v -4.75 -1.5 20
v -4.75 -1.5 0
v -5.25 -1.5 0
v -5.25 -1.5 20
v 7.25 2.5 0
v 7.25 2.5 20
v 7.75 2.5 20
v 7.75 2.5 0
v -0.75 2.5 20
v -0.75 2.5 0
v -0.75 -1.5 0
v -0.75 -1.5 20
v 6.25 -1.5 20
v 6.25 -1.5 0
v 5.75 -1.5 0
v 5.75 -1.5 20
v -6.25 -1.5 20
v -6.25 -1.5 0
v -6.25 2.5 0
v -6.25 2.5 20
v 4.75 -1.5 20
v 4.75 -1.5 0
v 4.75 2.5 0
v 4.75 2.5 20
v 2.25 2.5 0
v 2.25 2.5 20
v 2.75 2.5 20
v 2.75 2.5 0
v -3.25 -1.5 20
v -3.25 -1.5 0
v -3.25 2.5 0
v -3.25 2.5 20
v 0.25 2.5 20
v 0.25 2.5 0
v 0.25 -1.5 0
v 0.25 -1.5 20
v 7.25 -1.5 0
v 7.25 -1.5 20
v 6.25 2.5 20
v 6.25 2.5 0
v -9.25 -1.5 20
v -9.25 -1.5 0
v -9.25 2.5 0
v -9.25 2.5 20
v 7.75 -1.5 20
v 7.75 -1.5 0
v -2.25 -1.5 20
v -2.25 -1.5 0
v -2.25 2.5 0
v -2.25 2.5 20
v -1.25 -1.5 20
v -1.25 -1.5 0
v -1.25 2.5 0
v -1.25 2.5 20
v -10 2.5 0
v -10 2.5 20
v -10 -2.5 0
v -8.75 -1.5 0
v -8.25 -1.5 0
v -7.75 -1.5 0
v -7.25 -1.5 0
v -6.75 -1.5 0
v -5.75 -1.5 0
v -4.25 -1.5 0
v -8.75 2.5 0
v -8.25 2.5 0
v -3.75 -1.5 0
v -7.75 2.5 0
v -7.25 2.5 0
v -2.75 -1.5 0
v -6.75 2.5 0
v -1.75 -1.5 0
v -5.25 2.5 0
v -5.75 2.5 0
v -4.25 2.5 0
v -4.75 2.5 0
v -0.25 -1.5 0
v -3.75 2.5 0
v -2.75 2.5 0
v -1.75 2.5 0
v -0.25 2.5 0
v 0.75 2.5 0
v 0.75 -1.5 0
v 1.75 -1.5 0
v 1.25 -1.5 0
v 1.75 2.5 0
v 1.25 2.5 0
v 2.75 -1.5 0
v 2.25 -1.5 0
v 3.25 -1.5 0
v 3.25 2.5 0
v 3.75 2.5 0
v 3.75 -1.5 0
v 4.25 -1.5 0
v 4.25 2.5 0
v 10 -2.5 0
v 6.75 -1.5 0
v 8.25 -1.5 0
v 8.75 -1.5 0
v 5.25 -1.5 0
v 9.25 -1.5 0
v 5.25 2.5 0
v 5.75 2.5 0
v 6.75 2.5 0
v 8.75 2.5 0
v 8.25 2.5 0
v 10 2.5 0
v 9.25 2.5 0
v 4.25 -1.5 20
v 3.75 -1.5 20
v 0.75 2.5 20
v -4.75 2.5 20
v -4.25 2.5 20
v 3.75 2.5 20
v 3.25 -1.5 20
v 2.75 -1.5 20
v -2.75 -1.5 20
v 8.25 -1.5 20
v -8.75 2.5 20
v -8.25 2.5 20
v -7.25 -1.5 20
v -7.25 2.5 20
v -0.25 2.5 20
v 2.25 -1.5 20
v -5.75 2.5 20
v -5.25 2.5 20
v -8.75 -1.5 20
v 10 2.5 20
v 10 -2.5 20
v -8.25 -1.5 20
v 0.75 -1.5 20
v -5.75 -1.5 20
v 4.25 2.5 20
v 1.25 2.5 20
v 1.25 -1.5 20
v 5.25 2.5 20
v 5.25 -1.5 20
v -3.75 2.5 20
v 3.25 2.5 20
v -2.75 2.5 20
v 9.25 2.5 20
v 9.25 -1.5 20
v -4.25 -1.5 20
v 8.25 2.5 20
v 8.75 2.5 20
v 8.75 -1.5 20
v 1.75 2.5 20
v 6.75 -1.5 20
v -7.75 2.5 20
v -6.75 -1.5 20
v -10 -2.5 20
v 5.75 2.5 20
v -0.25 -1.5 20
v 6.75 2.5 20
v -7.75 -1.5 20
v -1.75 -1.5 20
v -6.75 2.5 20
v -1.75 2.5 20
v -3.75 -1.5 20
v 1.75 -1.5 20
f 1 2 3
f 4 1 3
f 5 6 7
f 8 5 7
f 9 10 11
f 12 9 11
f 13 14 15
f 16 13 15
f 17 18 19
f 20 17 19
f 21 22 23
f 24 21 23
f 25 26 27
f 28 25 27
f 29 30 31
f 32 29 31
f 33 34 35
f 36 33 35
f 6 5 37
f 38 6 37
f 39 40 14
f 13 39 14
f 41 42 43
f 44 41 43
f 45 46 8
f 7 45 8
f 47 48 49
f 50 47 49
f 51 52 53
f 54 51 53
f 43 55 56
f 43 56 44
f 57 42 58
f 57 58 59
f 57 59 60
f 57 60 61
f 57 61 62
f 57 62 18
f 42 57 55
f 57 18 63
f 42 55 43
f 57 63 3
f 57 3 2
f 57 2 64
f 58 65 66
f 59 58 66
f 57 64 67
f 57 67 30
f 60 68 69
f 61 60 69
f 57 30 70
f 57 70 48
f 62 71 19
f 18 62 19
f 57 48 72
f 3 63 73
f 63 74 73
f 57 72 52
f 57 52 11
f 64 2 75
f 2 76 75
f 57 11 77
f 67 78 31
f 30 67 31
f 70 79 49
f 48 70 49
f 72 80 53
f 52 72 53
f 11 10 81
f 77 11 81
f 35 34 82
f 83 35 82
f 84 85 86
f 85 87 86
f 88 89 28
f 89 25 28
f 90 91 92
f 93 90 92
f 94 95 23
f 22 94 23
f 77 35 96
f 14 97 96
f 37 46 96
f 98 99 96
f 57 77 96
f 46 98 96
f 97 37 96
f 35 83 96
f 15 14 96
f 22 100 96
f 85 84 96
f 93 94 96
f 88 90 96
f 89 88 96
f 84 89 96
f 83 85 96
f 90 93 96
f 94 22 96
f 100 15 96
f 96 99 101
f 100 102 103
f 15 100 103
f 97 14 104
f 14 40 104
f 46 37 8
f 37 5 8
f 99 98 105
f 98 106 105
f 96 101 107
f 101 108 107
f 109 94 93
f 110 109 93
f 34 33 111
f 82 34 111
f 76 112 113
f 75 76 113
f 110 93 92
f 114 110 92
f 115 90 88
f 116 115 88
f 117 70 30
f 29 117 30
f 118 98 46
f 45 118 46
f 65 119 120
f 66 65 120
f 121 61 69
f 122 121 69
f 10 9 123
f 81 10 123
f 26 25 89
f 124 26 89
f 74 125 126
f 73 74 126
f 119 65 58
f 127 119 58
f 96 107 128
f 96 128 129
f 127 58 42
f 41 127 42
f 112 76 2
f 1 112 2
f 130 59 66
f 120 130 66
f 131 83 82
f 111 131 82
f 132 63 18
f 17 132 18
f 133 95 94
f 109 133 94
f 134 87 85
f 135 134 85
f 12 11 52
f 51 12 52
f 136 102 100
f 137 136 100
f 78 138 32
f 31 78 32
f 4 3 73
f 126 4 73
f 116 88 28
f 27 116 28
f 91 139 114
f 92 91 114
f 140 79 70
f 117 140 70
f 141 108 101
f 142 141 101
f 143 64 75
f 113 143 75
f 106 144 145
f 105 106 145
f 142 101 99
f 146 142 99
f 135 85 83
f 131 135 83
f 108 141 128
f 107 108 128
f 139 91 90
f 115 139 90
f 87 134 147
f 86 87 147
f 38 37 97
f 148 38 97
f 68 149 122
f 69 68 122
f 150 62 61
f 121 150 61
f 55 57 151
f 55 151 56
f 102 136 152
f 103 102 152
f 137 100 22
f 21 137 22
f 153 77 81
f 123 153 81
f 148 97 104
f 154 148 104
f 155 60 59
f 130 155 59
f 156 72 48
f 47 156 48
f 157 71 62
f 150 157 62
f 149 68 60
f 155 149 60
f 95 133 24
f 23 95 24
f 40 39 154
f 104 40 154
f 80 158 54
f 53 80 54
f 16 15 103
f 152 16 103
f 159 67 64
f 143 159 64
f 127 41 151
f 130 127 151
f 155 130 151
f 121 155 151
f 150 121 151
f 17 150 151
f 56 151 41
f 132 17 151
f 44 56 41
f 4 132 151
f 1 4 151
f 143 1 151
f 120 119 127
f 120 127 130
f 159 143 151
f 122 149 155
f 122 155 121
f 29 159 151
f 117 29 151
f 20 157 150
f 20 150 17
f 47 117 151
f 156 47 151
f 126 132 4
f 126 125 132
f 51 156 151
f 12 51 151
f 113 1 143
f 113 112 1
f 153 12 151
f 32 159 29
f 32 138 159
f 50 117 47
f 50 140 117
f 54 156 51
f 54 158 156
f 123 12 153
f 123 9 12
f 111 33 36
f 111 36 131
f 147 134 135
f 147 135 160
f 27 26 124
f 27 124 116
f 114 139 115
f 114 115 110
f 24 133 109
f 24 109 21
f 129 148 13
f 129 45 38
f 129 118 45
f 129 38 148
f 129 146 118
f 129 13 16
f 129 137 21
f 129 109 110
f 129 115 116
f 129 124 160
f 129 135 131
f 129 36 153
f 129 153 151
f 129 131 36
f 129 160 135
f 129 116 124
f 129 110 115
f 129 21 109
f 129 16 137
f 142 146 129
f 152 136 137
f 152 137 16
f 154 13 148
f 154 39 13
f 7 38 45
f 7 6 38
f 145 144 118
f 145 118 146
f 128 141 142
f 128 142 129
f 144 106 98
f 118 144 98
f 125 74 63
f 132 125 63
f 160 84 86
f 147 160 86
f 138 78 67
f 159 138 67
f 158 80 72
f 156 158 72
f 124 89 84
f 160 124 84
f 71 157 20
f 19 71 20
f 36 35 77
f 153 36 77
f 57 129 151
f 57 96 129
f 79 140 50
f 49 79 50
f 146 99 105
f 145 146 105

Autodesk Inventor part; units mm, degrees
ref_plane "YZ Plane" through (0, 0, 0) normal (1, 0, 0) x (0, 1, 0)
ref_plane "XZ Plane" through (0, 0, 0) normal (0, 1, 0) x (-1, 0, 0)
ref_plane "XY Plane" through (0, 0, 0) normal (0, 0, 1) x (1, 0, 0)
sketch "Sketch1" plane through (0, 0, 0) normal (0, 0, 1) x (1, 0, 0)
  line L0 (-10, 2.5) -> (10, 2.5)
  line L1 (10, 2.5) -> (10, -2.5)
  line L2 (10, -2.5) -> (-10, -2.5)
  line L3 (-10, -2.5) -> (-10, 2.5)
  line L4 (-10, 2.5) -> (10, -2.5) construction
  line L5 (10, 2.5) -> (-10, -2.5) construction
  point P0 (0, 0)
  dimension "d0" = 20
  dimension "d1" = 5
extrude "Extrusion1" add sketch "Sketch1" along normal blind 20
sketch "Sketch2" plane through (0, 0, 20) normal (0, 0, 1) x (1, 0, 0)
  line L0 (-0.25, 3.3824) -> (0.25, 3.3824)
  line L1 (0.25, 3.3824) -> (0.25, -1.5)
  line L2 (0.25, -1.5) -> (-0.25, -1.5)
  line L3 (-0.25, -1.5) -> (-0.25, 3.3824)
  line L4 (-0.25, 3.3824) -> (0.25, -1.5) construction
  line L5 (0.25, 3.3824) -> (-0.25, -1.5) construction
  line L6 (-10, -2.5) -> (10, -2.5) projected
  line L7 (0.75, 3.3824) -> (1.25, 3.3824)
  line L8 (1.25, 3.3824) -> (1.25, -1.5)
  line L9 (1.25, -1.5) -> (0.75, -1.5)
  line L10 (0.75, -1.5) -> (0.75, 3.3824)
  line L11 (0.75, 3.3824) -> (1.25, -1.5) construction
  line L12 (1.25, 3.3824) -> (0.75, -1.5) construction
  line L13 (1.75, 3.3824) -> (2.25, 3.3824)
  line L14 (2.25, 3.3824) -> (2.25, -1.5)
  line L15 (2.25, -1.5) -> (1.75, -1.5)
  line L16 (1.75, -1.5) -> (1.75, 3.3824)
  line L17 (1.75, 3.3824) -> (2.25, -1.5) construction
  line L18 (2.25, 3.3824) -> (1.75, -1.5) construction
  line L19 (2.75, 3.3824) -> (3.25, 3.3824)
  line L20 (3.25, 3.3824) -> (3.25, -1.5)
  line L21 (3.25, -1.5) -> (2.75, -1.5)
  line L22 (2.75, -1.5) -> (2.75, 3.3824)
  line L23 (2.75, 3.3824) -> (3.25, -1.5) construction
  line L24 (3.25, 3.3824) -> (2.75, -1.5) construction
  line L25 (3.75, 3.3824) -> (4.25, 3.3824)
  line L26 (4.25, 3.3824) -> (4.25, -1.5)
  line L27 (4.25, -1.5) -> (3.75, -1.5)
  line L28 (3.75, -1.5) -> (3.75, 3.3824)
  line L29 (3.75, 3.3824) -> (4.25, -1.5) construction
  line L30 (4.25, 3.3824) -> (3.75, -1.5) construction
  line L31 (4.75, 3.3824) -> (5.25, 3.3824)
  line L32 (5.25, 3.3824) -> (5.25, -1.5)
  line L33 (5.25, -1.5) -> (4.75, -1.5)
  line L34 (4.75, -1.5) -> (4.75, 3.3824)
  line L35 (4.75, 3.3824) -> (5.25, -1.5) construction
  line L36 (5.25, 3.3824) -> (4.75, -1.5) construction
  line L37 (5.75, 3.3824) -> (6.25, 3.3824)
  line L38 (6.25, 3.3824) -> (6.25, -1.5)
  line L39 (6.25, -1.5) -> (5.75, -1.5)
  line L40 (5.75, -1.5) -> (5.75, 3.3824)
  line L41 (5.75, 3.3824) -> (6.25, -1.5) construction
  line L42 (6.25, 3.3824) -> (5.75, -1.5) construction
  line L43 (6.75, 3.3824) -> (7.25, 3.3824)
  line L44 (7.25, 3.3824) -> (7.25, -1.5)
  line L45 (7.25, -1.5) -> (6.75, -1.5)
  line L46 (6.75, -1.5) -> (6.75, 3.3824)
  line L47 (6.75, 3.3824) -> (7.25, -1.5) construction
  line L48 (7.25, 3.3824) -> (6.75, -1.5) construction
  line L49 (7.75, 3.3824) -> (8.25, 3.3824)
  line L50 (8.25, 3.3824) -> (8.25, -1.5)
  line L51 (8.25, -1.5) -> (7.75, -1.5)
  line L52 (7.75, -1.5) -> (7.75, 3.3824)
  line L53 (7.75, 3.3824) -> (8.25, -1.5) construction
  line L54 (8.25, 3.3824) -> (7.75, -1.5) construction
  line L55 (8.75, 3.3824) -> (9.25, 3.3824)
  line L56 (9.25, 3.3824) -> (9.25, -1.5)
  line L57 (9.25, -1.5) -> (8.75, -1.5)
  line L58 (8.75, -1.5) -> (8.75, 3.3824)
  line L59 (8.75, 3.3824) -> (9.25, -1.5) construction
  line L60 (9.25, 3.3824) -> (8.75, -1.5) construction
  line L61 (-1.25, 3.3824) -> (-0.75, 3.3824)
  line L62 (-0.75, 3.3824) -> (-0.75, -1.5)
  line L63 (-0.75, -1.5) -> (-1.25, -1.5)
  line L64 (-1.25, -1.5) -> (-1.25, 3.3824)
  line L65 (-1.25, 3.3824) -> (-0.75, -1.5) construction
  line L66 (-0.75, 3.3824) -> (-1.25, -1.5) construction
  line L67 (-0.25, 3.3824) -> (0.25, 3.3824)
  line L68 (0.25, 3.3824) -> (0.25, -1.5)
  line L69 (0.25, -1.5) -> (-0.25, -1.5)
  line L70 (-0.25, -1.5) -> (-0.25, 3.3824)
  line L71 (-0.25, 3.3824) -> (0.25, -1.5) construction
  line L72 (0.25, 3.3824) -> (-0.25, -1.5) construction
  line L73 (0.75, 3.3824) -> (1.25, 3.3824)
  line L74 (1.25, 3.3824) -> (1.25, -1.5)
  line L75 (1.25, -1.5) -> (0.75, -1.5)
  line L76 (0.75, -1.5) -> (0.75, 3.3824)
  line L77 (0.75, 3.3824) -> (1.25, -1.5) construction
  line L78 (1.25, 3.3824) -> (0.75, -1.5) construction
  line L79 (1.75, 3.3824) -> (2.25, 3.3824)
  line L80 (2.25, 3.3824) -> (2.25, -1.5)
  line L81 (2.25, -1.5) -> (1.75, -1.5)
  line L82 (1.75, -1.5) -> (1.75, 3.3824)
  line L83 (1.75, 3.3824) -> (2.25, -1.5) construction
  line L84 (2.25, 3.3824) -> (1.75, -1.5) construction
  line L85 (2.75, 3.3824) -> (3.25, 3.3824)
  line L86 (3.25, 3.3824) -> (3.25, -1.5)
  line L87 (3.25, -1.5) -> (2.75, -1.5)
  line L88 (2.75, -1.5) -> (2.75, 3.3824)
  line L89 (2.75, 3.3824) -> (3.25, -1.5) construction
  line L90 (3.25, 3.3824) -> (2.75, -1.5) construction
  line L91 (3.75, 3.3824) -> (4.25, 3.3824)
  line L92 (4.25, 3.3824) -> (4.25, -1.5)
  line L93 (4.25, -1.5) -> (3.75, -1.5)
  line L94 (3.75, -1.5) -> (3.75, 3.3824)
  line L95 (3.75, 3.3824) -> (4.25, -1.5) construction
  line L96 (4.25, 3.3824) -> (3.75, -1.5) construction
  line L97 (4.75, 3.3824) -> (5.25, 3.3824)
  line L98 (5.25, 3.3824) -> (5.25, -1.5)
  line L99 (5.25, -1.5) -> (4.75, -1.5)
  line L100 (4.75, -1.5) -> (4.75, 3.3824)
  line L101 (4.75, 3.3824) -> (5.25, -1.5) construction
  line L102 (5.25, 3.3824) -> (4.75, -1.5) construction
  line L103 (5.75, 3.3824) -> (6.25, 3.3824)
  line L104 (6.25, 3.3824) -> (6.25, -1.5)
  line L105 (6.25, -1.5) -> (5.75, -1.5)
  line L106 (5.75, -1.5) -> (5.75, 3.3824)
  line L107 (5.75, 3.3824) -> (6.25, -1.5) construction
  line L108 (6.25, 3.3824) -> (5.75, -1.5) construction
  line L109 (6.75, 3.3824) -> (7.25, 3.3824)
  line L110 (7.25, 3.3824) -> (7.25, -1.5)
  line L111 (7.25, -1.5) -> (6.75, -1.5)
  line L112 (6.75, -1.5) -> (6.75, 3.3824)
  line L113 (6.75, 3.3824) -> (7.25, -1.5) construction
  line L114 (7.25, 3.3824) -> (6.75, -1.5) construction
  line L115 (7.75, 3.3824) -> (8.25, 3.3824)
  line L116 (8.25, 3.3824) -> (8.25, -1.5)
  line L117 (8.25, -1.5) -> (7.75, -1.5)
  line L118 (7.75, -1.5) -> (7.75, 3.3824)
  line L119 (7.75, 3.3824) -> (8.25, -1.5) construction
  line L120 (8.25, 3.3824) -> (7.75, -1.5) construction
  line L121 (-2.25, 3.3824) -> (-1.75, 3.3824)
  line L122 (-1.75, 3.3824) -> (-1.75, -1.5)
  line L123 (-1.75, -1.5) -> (-2.25, -1.5)
  line L124 (-2.25, -1.5) -> (-2.25, 3.3824)
  line L125 (-2.25, 3.3824) -> (-1.75, -1.5) construction
  line L126 (-1.75, 3.3824) -> (-2.25, -1.5) construction
  line L127 (-1.25, 3.3824) -> (-0.75, 3.3824)
  line L128 (-0.75, 3.3824) -> (-0.75, -1.5)
  line L129 (-0.75, -1.5) -> (-1.25, -1.5)
  line L130 (-1.25, -1.5) -> (-1.25, 3.3824)
  line L131 (-1.25, 3.3824) -> (-0.75, -1.5) construction
  line L132 (-0.75, 3.3824) -> (-1.25, -1.5) construction
  line L133 (-0.25, 3.3824) -> (0.25, 3.3824)
  line L134 (0.25, 3.3824) -> (0.25, -1.5)
  line L135 (0.25, -1.5) -> (-0.25, -1.5)
  line L136 (-0.25, -1.5) -> (-0.25, 3.3824)
  line L137 (-0.25, 3.3824) -> (0.25, -1.5) construction
  line L138 (0.25, 3.3824) -> (-0.25, -1.5) construction
  line L139 (0.75, 3.3824) -> (1.25, 3.3824)
  line L140 (1.25, 3.3824) -> (1.25, -1.5)
  line L141 (1.25, -1.5) -> (0.75, -1.5)
  line L142 (0.75, -1.5) -> (0.75, 3.3824)
  line L143 (0.75, 3.3824) -> (1.25, -1.5) construction
  line L144 (1.25, 3.3824) -> (0.75, -1.5) construction
  line L145 (1.75, 3.3824) -> (2.25, 3.3824)
  line L146 (2.25, 3.3824) -> (2.25, -1.5)
  line L147 (2.25, -1.5) -> (1.75, -1.5)
  line L148 (1.75, -1.5) -> (1.75, 3.3824)
  line L149 (1.75, 3.3824) -> (2.25, -1.5) construction
  line L150 (2.25, 3.3824) -> (1.75, -1.5) construction
  line L151 (2.75, 3.3824) -> (3.25, 3.3824)
  line L152 (3.25, 3.3824) -> (3.25, -1.5)
  line L153 (3.25, -1.5) -> (2.75, -1.5)
  line L154 (2.75, -1.5) -> (2.75, 3.3824)
  line L155 (2.75, 3.3824) -> (3.25, -1.5) construction
  line L156 (3.25, 3.3824) -> (2.75, -1.5) construction
  line L157 (3.75, 3.3824) -> (4.25, 3.3824)
  line L158 (4.25, 3.3824) -> (4.25, -1.5)
  line L159 (4.25, -1.5) -> (3.75, -1.5)
  line L160 (3.75, -1.5) -> (3.75, 3.3824)
  line L161 (3.75, 3.3824) -> (4.25, -1.5) construction
  line L162 (4.25, 3.3824) -> (3.75, -1.5) construction
  line L163 (4.75, 3.3824) -> (5.25, 3.3824)
  line L164 (5.25, 3.3824) -> (5.25, -1.5)
  line L165 (5.25, -1.5) -> (4.75, -1.5)
  line L166 (4.75, -1.5) -> (4.75, 3.3824)
  line L167 (4.75, 3.3824) -> (5.25, -1.5) construction
  line L168 (5.25, 3.3824) -> (4.75, -1.5) construction
  line L169 (5.75, 3.3824) -> (6.25, 3.3824)
  line L170 (6.25, 3.3824) -> (6.25, -1.5)
  line L171 (6.25, -1.5) -> (5.75, -1.5)
  line L172 (5.75, -1.5) -> (5.75, 3.3824)
  line L173 (5.75, 3.3824) -> (6.25, -1.5) construction
  line L174 (6.25, 3.3824) -> (5.75, -1.5) construction
  line L175 (6.75, 3.3824) -> (7.25, 3.3824)
  line L176 (7.25, 3.3824) -> (7.25, -1.5)
  line L177 (7.25, -1.5) -> (6.75, -1.5)
  line L178 (6.75, -1.5) -> (6.75, 3.3824)
  line L179 (6.75, 3.3824) -> (7.25, -1.5) construction
  line L180 (7.25, 3.3824) -> (6.75, -1.5) construction
  line L181 (-3.25, 3.3824) -> (-2.75, 3.3824)
  line L182 (-2.75, 3.3824) -> (-2.75, -1.5)
  line L183 (-2.75, -1.5) -> (-3.25, -1.5)
  line L184 (-3.25, -1.5) -> (-3.25, 3.3824)
  line L185 (-3.25, 3.3824) -> (-2.75, -1.5) construction
  line L186 (-2.75, 3.3824) -> (-3.25, -1.5) construction
  line L187 (-2.25, 3.3824) -> (-1.75, 3.3824)
  line L188 (-1.75, 3.3824) -> (-1.75, -1.5)
  line L189 (-1.75, -1.5) -> (-2.25, -1.5)
  line L190 (-2.25, -1.5) -> (-2.25, 3.3824)
  line L191 (-2.25, 3.3824) -> (-1.75, -1.5) construction
  line L192 (-1.75, 3.3824) -> (-2.25, -1.5) construction
  line L193 (-1.25, 3.3824) -> (-0.75, 3.3824)
  line L194 (-0.75, 3.3824) -> (-0.75, -1.5)
  line L195 (-0.75, -1.5) -> (-1.25, -1.5)
  line L196 (-1.25, -1.5) -> (-1.25, 3.3824)
  line L197 (-1.25, 3.3824) -> (-0.75, -1.5) construction
  line L198 (-0.75, 3.3824) -> (-1.25, -1.5) construction
  line L199 (-0.25, 3.3824) -> (0.25, 3.3824)
  line L200 (0.25, 3.3824) -> (0.25, -1.5)
  line L201 (0.25, -1.5) -> (-0.25, -1.5)
  line L202 (-0.25, -1.5) -> (-0.25, 3.3824)
  line L203 (-0.25, 3.3824) -> (0.25, -1.5) construction
  line L204 (0.25, 3.3824) -> (-0.25, -1.5) construction
  line L205 (0.75, 3.3824) -> (1.25, 3.3824)
  line L206 (1.25, 3.3824) -> (1.25, -1.5)
  line L207 (1.25, -1.5) -> (0.75, -1.5)
  line L208 (0.75, -1.5) -> (0.75, 3.3824)
  line L209 (0.75, 3.3824) -> (1.25, -1.5) construction
  line L210 (1.25, 3.3824) -> (0.75, -1.5) construction
  line L211 (1.75, 3.3824) -> (2.25, 3.3824)
  line L212 (2.25, 3.3824) -> (2.25, -1.5)
  line L213 (2.25, -1.5) -> (1.75, -1.5)
  line L214 (1.75, -1.5) -> (1.75, 3.3824)
  line L215 (1.75, 3.3824) -> (2.25, -1.5) construction
  line L216 (2.25, 3.3824) -> (1.75, -1.5) construction
  line L217 (2.75, 3.3824) -> (3.25, 3.3824)
  line L218 (3.25, 3.3824) -> (3.25, -1.5)
  line L219 (3.25, -1.5) -> (2.75, -1.5)
  line L220 (2.75, -1.5) -> (2.75, 3.3824)
  line L221 (2.75, 3.3824) -> (3.25, -1.5) construction
  line L222 (3.25, 3.3824) -> (2.75, -1.5) construction
  line L223 (3.75, 3.3824) -> (4.25, 3.3824)
  line L224 (4.25, 3.3824) -> (4.25, -1.5)
  line L225 (4.25, -1.5) -> (3.75, -1.5)
  line L226 (3.75, -1.5) -> (3.75, 3.3824)
  line L227 (3.75, 3.3824) -> (4.25, -1.5) construction
  line L228 (4.25, 3.3824) -> (3.75, -1.5) construction
  line L229 (4.75, 3.3824) -> (5.25, 3.3824)
  line L230 (5.25, 3.3824) -> (5.25, -1.5)
  line L231 (5.25, -1.5) -> (4.75, -1.5)
  line L232 (4.75, -1.5) -> (4.75, 3.3824)
  line L233 (4.75, 3.3824) -> (5.25, -1.5) construction
  line L234 (5.25, 3.3824) -> (4.75, -1.5) construction
  line L235 (5.75, 3.3824) -> (6.25, 3.3824)
  line L236 (6.25, 3.3824) -> (6.25, -1.5)
  line L237 (6.25, -1.5) -> (5.75, -1.5)
  line L238 (5.75, -1.5) -> (5.75, 3.3824)
  line L239 (5.75, 3.3824) -> (6.25, -1.5) construction
  line L240 (6.25, 3.3824) -> (5.75, -1.5) construction
  line L241 (-4.25, 3.3824) -> (-3.75, 3.3824)
  line L242 (-3.75, 3.3824) -> (-3.75, -1.5)
  line L243 (-3.75, -1.5) -> (-4.25, -1.5)
  line L244 (-4.25, -1.5) -> (-4.25, 3.3824)
  line L245 (-4.25, 3.3824) -> (-3.75, -1.5) construction
  line L246 (-3.75, 3.3824) -> (-4.25, -1.5) construction
  line L247 (-3.25, 3.3824) -> (-2.75, 3.3824)
  line L248 (-2.75, 3.3824) -> (-2.75, -1.5)
  line L249 (-2.75, -1.5) -> (-3.25, -1.5)
  line L250 (-3.25, -1.5) -> (-3.25, 3.3824)
  line L251 (-3.25, 3.3824) -> (-2.75, -1.5) construction
  line L252 (-2.75, 3.3824) -> (-3.25, -1.5) construction
  line L253 (-2.25, 3.3824) -> (-1.75, 3.3824)
  line L254 (-1.75, 3.3824) -> (-1.75, -1.5)
  line L255 (-1.75, -1.5) -> (-2.25, -1.5)
  line L256 (-2.25, -1.5) -> (-2.25, 3.3824)
  line L257 (-2.25, 3.3824) -> (-1.75, -1.5) construction
  line L258 (-1.75, 3.3824) -> (-2.25, -1.5) construction
  line L259 (-1.25, 3.3824) -> (-0.75, 3.3824)
  line L260 (-0.75, 3.3824) -> (-0.75, -1.5)
  line L261 (-0.75, -1.5) -> (-1.25, -1.5)
  line L262 (-1.25, -1.5) -> (-1.25, 3.3824)
  line L263 (-1.25, 3.3824) -> (-0.75, -1.5) construction
  line L264 (-0.75, 3.3824) -> (-1.25, -1.5) construction
  line L265 (-0.25, 3.3824) -> (0.25, 3.3824)
  line L266 (0.25, 3.3824) -> (0.25, -1.5)
  line L267 (0.25, -1.5) -> (-0.25, -1.5)
  line L268 (-0.25, -1.5) -> (-0.25, 3.3824)
  line L269 (-0.25, 3.3824) -> (0.25, -1.5) construction
  line L270 (0.25, 3.3824) -> (-0.25, -1.5) construction
  line L271 (0.75, 3.3824) -> (1.25, 3.3824)
  line L272 (1.25, 3.3824) -> (1.25, -1.5)
  line L273 (1.25, -1.5) -> (0.75, -1.5)
  line L274 (0.75, -1.5) -> (0.75, 3.3824)
  line L275 (0.75, 3.3824) -> (1.25, -1.5) construction
  line L276 (1.25, 3.3824) -> (0.75, -1.5) construction
  line L277 (1.75, 3.3824) -> (2.25, 3.3824)
  line L278 (2.25, 3.3824) -> (2.25, -1.5)
  line L279 (2.25, -1.5) -> (1.75, -1.5)
  line L280 (1.75, -1.5) -> (1.75, 3.3824)
  line L281 (1.75, 3.3824) -> (2.25, -1.5) construction
  line L282 (2.25, 3.3824) -> (1.75, -1.5) construction
  line L283 (2.75, 3.3824) -> (3.25, 3.3824)
  line L284 (3.25, 3.3824) -> (3.25, -1.5)
  line L285 (3.25, -1.5) -> (2.75, -1.5)
  line L286 (2.75, -1.5) -> (2.75, 3.3824)
  line L287 (2.75, 3.3824) -> (3.25, -1.5) construction
  line L288 (3.25, 3.3824) -> (2.75, -1.5) construction
  line L289 (3.75, 3.3824) -> (4.25, 3.3824)
  line L290 (4.25, 3.3824) -> (4.25, -1.5)
  line L291 (4.25, -1.5) -> (3.75, -1.5)
  line L292 (3.75, -1.5) -> (3.75, 3.3824)
  line L293 (3.75, 3.3824) -> (4.25, -1.5) construction
  line L294 (4.25, 3.3824) -> (3.75, -1.5) construction
  line L295 (4.75, 3.3824) -> (5.25, 3.3824)
  line L296 (5.25, 3.3824) -> (5.25, -1.5)
  line L297 (5.25, -1.5) -> (4.75, -1.5)
  line L298 (4.75, -1.5) -> (4.75, 3.3824)
  line L299 (4.75, 3.3824) -> (5.25, -1.5) construction
  line L300 (5.25, 3.3824) -> (4.75, -1.5) construction
  line L301 (-5.25, 3.3824) -> (-4.75, 3.3824)
  line L302 (-4.75, 3.3824) -> (-4.75, -1.5)
  line L303 (-4.75, -1.5) -> (-5.25, -1.5)
  line L304 (-5.25, -1.5) -> (-5.25, 3.3824)
  line L305 (-5.25, 3.3824) -> (-4.75, -1.5) construction
  line L306 (-4.75, 3.3824) -> (-5.25, -1.5) construction
  line L307 (-4.25, 3.3824) -> (-3.75, 3.3824)
  line L308 (-3.75, 3.3824) -> (-3.75, -1.5)
  line L309 (-3.75, -1.5) -> (-4.25, -1.5)
  line L310 (-4.25, -1.5) -> (-4.25, 3.3824)
  line L311 (-4.25, 3.3824) -> (-3.75, -1.5) construction
  line L312 (-3.75, 3.3824) -> (-4.25, -1.5) construction
  line L313 (-3.25, 3.3824) -> (-2.75, 3.3824)
  line L314 (-2.75, 3.3824) -> (-2.75, -1.5)
  line L315 (-2.75, -1.5) -> (-3.25, -1.5)
  line L316 (-3.25, -1.5) -> (-3.25, 3.3824)
  line L317 (-3.25, 3.3824) -> (-2.75, -1.5) construction
  line L318 (-2.75, 3.3824) -> (-3.25, -1.5) construction
  line L319 (-2.25, 3.3824) -> (-1.75, 3.3824)
  line L320 (-1.75, 3.3824) -> (-1.75, -1.5)
  line L321 (-1.75, -1.5) -> (-2.25, -1.5)
  line L322 (-2.25, -1.5) -> (-2.25, 3.3824)
  line L323 (-2.25, 3.3824) -> (-1.75, -1.5) construction
  line L324 (-1.75, 3.3824) -> (-2.25, -1.5) construction
  line L325 (-1.25, 3.3824) -> (-0.75, 3.3824)
  line L326 (-0.75, 3.3824) -> (-0.75, -1.5)
  line L327 (-0.75, -1.5) -> (-1.25, -1.5)
  line L328 (-1.25, -1.5) -> (-1.25, 3.3824)
  line L329 (-1.25, 3.3824) -> (-0.75, -1.5) construction
  line L330 (-0.75, 3.3824) -> (-1.25, -1.5) construction
  line L331 (-0.25, 3.3824) -> (0.25, 3.3824)
  line L332 (0.25, 3.3824) -> (0.25, -1.5)
  line L333 (0.25, -1.5) -> (-0.25, -1.5)
  line L334 (-0.25, -1.5) -> (-0.25, 3.3824)
  line L335 (-0.25, 3.3824) -> (0.25, -1.5) construction
  line L336 (0.25, 3.3824) -> (-0.25, -1.5) construction
  line L337 (0.75, 3.3824) -> (1.25, 3.3824)
  line L338 (1.25, 3.3824) -> (1.25, -1.5)
  line L339 (1.25, -1.5) -> (0.75, -1.5)
  line L340 (0.75, -1.5) -> (0.75, 3.3824)
  line L341 (0.75, 3.3824) -> (1.25, -1.5) construction
  line L342 (1.25, 3.3824) -> (0.75, -1.5) construction
  line L343 (1.75, 3.3824) -> (2.25, 3.3824)
  line L344 (2.25, 3.3824) -> (2.25, -1.5)
  line L345 (2.25, -1.5) -> (1.75, -1.5)
  line L346 (1.75, -1.5) -> (1.75, 3.3824)
  line L347 (1.75, 3.3824) -> (2.25, -1.5) construction
  line L348 (2.25, 3.3824) -> (1.75, -1.5) construction
  line L349 (2.75, 3.3824) -> (3.25, 3.3824)
  line L350 (3.25, 3.3824) -> (3.25, -1.5)
  line L351 (3.25, -1.5) -> (2.75, -1.5)
  line L352 (2.75, -1.5) -> (2.75, 3.3824)
  line L353 (2.75, 3.3824) -> (3.25, -1.5) construction
  line L354 (3.25, 3.3824) -> (2.75, -1.5) construction
  line L355 (3.75, 3.3824) -> (4.25, 3.3824)
  line L356 (4.25, 3.3824) -> (4.25, -1.5)
  line L357 (4.25, -1.5) -> (3.75, -1.5)
  line L358 (3.75, -1.5) -> (3.75, 3.3824)
  line L359 (3.75, 3.3824) -> (4.25, -1.5) construction
  line L360 (4.25, 3.3824) -> (3.75, -1.5) construction
  line L361 (-6.25, 3.3824) -> (-5.75, 3.3824)
  line L362 (-5.75, 3.3824) -> (-5.75, -1.5)
  line L363 (-5.75, -1.5) -> (-6.25, -1.5)
  line L364 (-6.25, -1.5) -> (-6.25, 3.3824)
  line L365 (-6.25, 3.3824) -> (-5.75, -1.5) construction
  line L366 (-5.75, 3.3824) -> (-6.25, -1.5) construction
  line L367 (-5.25, 3.3824) -> (-4.75, 3.3824)
  line L368 (-4.75, 3.3824) -> (-4.75, -1.5)
  line L369 (-4.75, -1.5) -> (-5.25, -1.5)
  line L370 (-5.25, -1.5) -> (-5.25, 3.3824)
  line L371 (-5.25, 3.3824) -> (-4.75, -1.5) construction
  line L372 (-4.75, 3.3824) -> (-5.25, -1.5) construction
  line L373 (-4.25, 3.3824) -> (-3.75, 3.3824)
  line L374 (-3.75, 3.3824) -> (-3.75, -1.5)
  line L375 (-3.75, -1.5) -> (-4.25, -1.5)
  line L376 (-4.25, -1.5) -> (-4.25, 3.3824)
  line L377 (-4.25, 3.3824) -> (-3.75, -1.5) construction
  line L378 (-3.75, 3.3824) -> (-4.25, -1.5) construction
  line L379 (-3.25, 3.3824) -> (-2.75, 3.3824)
  line L380 (-2.75, 3.3824) -> (-2.75, -1.5)
  line L381 (-2.75, -1.5) -> (-3.25, -1.5)
  line L382 (-3.25, -1.5) -> (-3.25, 3.3824)
  line L383 (-3.25, 3.3824) -> (-2.75, -1.5) construction
  line L384 (-2.75, 3.3824) -> (-3.25, -1.5) construction
  line L385 (-2.25, 3.3824) -> (-1.75, 3.3824)
  line L386 (-1.75, 3.3824) -> (-1.75, -1.5)
  line L387 (-1.75, -1.5) -> (-2.25, -1.5)
  line L388 (-2.25, -1.5) -> (-2.25, 3.3824)
  line L389 (-2.25, 3.3824) -> (-1.75, -1.5) construction
  line L390 (-1.75, 3.3824) -> (-2.25, -1.5) construction
  line L391 (-1.25, 3.3824) -> (-0.75, 3.3824)
  line L392 (-0.75, 3.3824) -> (-0.75, -1.5)
  line L393 (-0.75, -1.5) -> (-1.25, -1.5)
  line L394 (-1.25, -1.5) -> (-1.25, 3.3824)
  line L395 (-1.25, 3.3824) -> (-0.75, -1.5) construction
  line L396 (-0.75, 3.3824) -> (-1.25, -1.5) construction
  line L397 (-0.25, 3.3824) -> (0.25, 3.3824)
  line L398 (0.25, 3.3824) -> (0.25, -1.5)
  line L399 (0.25, -1.5) -> (-0.25, -1.5)
  line L400 (-0.25, -1.5) -> (-0.25, 3.3824)
  line L401 (-0.25, 3.3824) -> (0.25, -1.5) construction
  line L402 (0.25, 3.3824) -> (-0.25, -1.5) construction
  line L403 (0.75, 3.3824) -> (1.25, 3.3824)
  line L404 (1.25, 3.3824) -> (1.25, -1.5)
  line L405 (1.25, -1.5) -> (0.75, -1.5)
  line L406 (0.75, -1.5) -> (0.75, 3.3824)
  line L407 (0.75, 3.3824) -> (1.25, -1.5) construction
  line L408 (1.25, 3.3824) -> (0.75, -1.5) construction
  line L409 (1.75, 3.3824) -> (2.25, 3.3824)
  line L410 (2.25, 3.3824) -> (2.25, -1.5)
  line L411 (2.25, -1.5) -> (1.75, -1.5)
  line L412 (1.75, -1.5) -> (1.75, 3.3824)
  line L413 (1.75, 3.3824) -> (2.25, -1.5) construction
  line L414 (2.25, 3.3824) -> (1.75, -1.5) construction
  line L415 (2.75, 3.3824) -> (3.25, 3.3824)
  line L416 (3.25, 3.3824) -> (3.25, -1.5)
  line L417 (3.25, -1.5) -> (2.75, -1.5)
  line L418 (2.75, -1.5) -> (2.75, 3.3824)
  line L419 (2.75, 3.3824) -> (3.25, -1.5) construction
  line L420 (3.25, 3.3824) -> (2.75, -1.5) construction
  line L421 (-7.25, 3.3824) -> (-6.75, 3.3824)
  line L422 (-6.75, 3.3824) -> (-6.75, -1.5)
  line L423 (-6.75, -1.5) -> (-7.25, -1.5)
  line L424 (-7.25, -1.5) -> (-7.25, 3.3824)
  line L425 (-7.25, 3.3824) -> (-6.75, -1.5) construction
  line L426 (-6.75, 3.3824) -> (-7.25, -1.5) construction
  line L427 (-6.25, 3.3824) -> (-5.75, 3.3824)
  line L428 (-5.75, 3.3824) -> (-5.75, -1.5)
  line L429 (-5.75, -1.5) -> (-6.25, -1.5)
  line L430 (-6.25, -1.5) -> (-6.25, 3.3824)
  line L431 (-6.25, 3.3824) -> (-5.75, -1.5) construction
  line L432 (-5.75, 3.3824) -> (-6.25, -1.5) construction
  line L433 (-5.25, 3.3824) -> (-4.75, 3.3824)
  line L434 (-4.75, 3.3824) -> (-4.75, -1.5)
  line L435 (-4.75, -1.5) -> (-5.25, -1.5)
  line L436 (-5.25, -1.5) -> (-5.25, 3.3824)
  line L437 (-5.25, 3.3824) -> (-4.75, -1.5) construction
  line L438 (-4.75, 3.3824) -> (-5.25, -1.5) construction
  line L439 (-4.25, 3.3824) -> (-3.75, 3.3824)
  line L440 (-3.75, 3.3824) -> (-3.75, -1.5)
  line L441 (-3.75, -1.5) -> (-4.25, -1.5)
  line L442 (-4.25, -1.5) -> (-4.25, 3.3824)
  line L443 (-4.25, 3.3824) -> (-3.75, -1.5) construction
  line L444 (-3.75, 3.3824) -> (-4.25, -1.5) construction
  line L445 (-3.25, 3.3824) -> (-2.75, 3.3824)
  line L446 (-2.75, 3.3824) -> (-2.75, -1.5)
  line L447 (-2.75, -1.5) -> (-3.25, -1.5)
  line L448 (-3.25, -1.5) -> (-3.25, 3.3824)
  line L449 (-3.25, 3.3824) -> (-2.75, -1.5) construction
  line L450 (-2.75, 3.3824) -> (-3.25, -1.5) construction
  line L451 (-2.25, 3.3824) -> (-1.75, 3.3824)
  line L452 (-1.75, 3.3824) -> (-1.75, -1.5)
  line L453 (-1.75, -1.5) -> (-2.25, -1.5)
  line L454 (-2.25, -1.5) -> (-2.25, 3.3824)
  line L455 (-2.25, 3.3824) -> (-1.75, -1.5) construction
  line L456 (-1.75, 3.3824) -> (-2.25, -1.5) construction
  line L457 (-1.25, 3.3824) -> (-0.75, 3.3824)
  line L458 (-0.75, 3.3824) -> (-0.75, -1.5)
  line L459 (-0.75, -1.5) -> (-1.25, -1.5)
  line L460 (-1.25, -1.5) -> (-1.25, 3.3824)
  line L461 (-1.25, 3.3824) -> (-0.75, -1.5) construction
  line L462 (-0.75, 3.3824) -> (-1.25, -1.5) construction
  line L463 (-0.25, 3.3824) -> (0.25, 3.3824)
  line L464 (0.25, 3.3824) -> (0.25, -1.5)
  line L465 (0.25, -1.5) -> (-0.25, -1.5)
  line L466 (-0.25, -1.5) -> (-0.25, 3.3824)
  line L467 (-0.25, 3.3824) -> (0.25, -1.5) construction
  line L468 (0.25, 3.3824) -> (-0.25, -1.5) construction
  line L469 (0.75, 3.3824) -> (1.25, 3.3824)
  line L470 (1.25, 3.3824) -> (1.25, -1.5)
  line L471 (1.25, -1.5) -> (0.75, -1.5)
  line L472 (0.75, -1.5) -> (0.75, 3.3824)
  line L473 (0.75, 3.3824) -> (1.25, -1.5) construction
  line L474 (1.25, 3.3824) -> (0.75, -1.5) construction
  line L475 (1.75, 3.3824) -> (2.25, 3.3824)
  line L476 (2.25, 3.3824) -> (2.25, -1.5)
  line L477 (2.25, -1.5) -> (1.75, -1.5)
  line L478 (1.75, -1.5) -> (1.75, 3.3824)
  line L479 (1.75, 3.3824) -> (2.25, -1.5) construction
  line L480 (2.25, 3.3824) -> (1.75, -1.5) construction
  line L481 (-8.25, 3.3824) -> (-7.75, 3.3824)
  line L482 (-7.75, 3.3824) -> (-7.75, -1.5)
  line L483 (-7.75, -1.5) -> (-8.25, -1.5)
  line L484 (-8.25, -1.5) -> (-8.25, 3.3824)
  line L485 (-8.25, 3.3824) -> (-7.75, -1.5) construction
  line L486 (-7.75, 3.3824) -> (-8.25, -1.5) construction
  line L487 (-7.25, 3.3824) -> (-6.75, 3.3824)
  line L488 (-6.75, 3.3824) -> (-6.75, -1.5)
  line L489 (-6.75, -1.5) -> (-7.25, -1.5)
  line L490 (-7.25, -1.5) -> (-7.25, 3.3824)
  line L491 (-7.25, 3.3824) -> (-6.75, -1.5) construction
  line L492 (-6.75, 3.3824) -> (-7.25, -1.5) construction
  line L493 (-6.25, 3.3824) -> (-5.75, 3.3824)
  line L494 (-5.75, 3.3824) -> (-5.75, -1.5)
  line L495 (-5.75, -1.5) -> (-6.25, -1.5)
  line L496 (-6.25, -1.5) -> (-6.25, 3.3824)
  line L497 (-6.25, 3.3824) -> (-5.75, -1.5) construction
  line L498 (-5.75, 3.3824) -> (-6.25, -1.5) construction
  line L499 (-5.25, 3.3824) -> (-4.75, 3.3824)
  line L500 (-4.75, 3.3824) -> (-4.75, -1.5)
  line L501 (-4.75, -1.5) -> (-5.25, -1.5)
  line L502 (-5.25, -1.5) -> (-5.25, 3.3824)
  line L503 (-5.25, 3.3824) -> (-4.75, -1.5) construction
  line L504 (-4.75, 3.3824) -> (-5.25, -1.5) construction
  line L505 (-4.25, 3.3824) -> (-3.75, 3.3824)
  line L506 (-3.75, 3.3824) -> (-3.75, -1.5)
  line L507 (-3.75, -1.5) -> (-4.25, -1.5)
  line L508 (-4.25, -1.5) -> (-4.25, 3.3824)
  line L509 (-4.25, 3.3824) -> (-3.75, -1.5) construction
  line L510 (-3.75, 3.3824) -> (-4.25, -1.5) construction
  line L511 (-3.25, 3.3824) -> (-2.75, 3.3824)
  line L512 (-2.75, 3.3824) -> (-2.75, -1.5)
  line L513 (-2.75, -1.5) -> (-3.25, -1.5)
  line L514 (-3.25, -1.5) -> (-3.25, 3.3824)
  line L515 (-3.25, 3.3824) -> (-2.75, -1.5) construction
  line L516 (-2.75, 3.3824) -> (-3.25, -1.5) construction
  line L517 (-2.25, 3.3824) -> (-1.75, 3.3824)
  line L518 (-1.75, 3.3824) -> (-1.75, -1.5)
  line L519 (-1.75, -1.5) -> (-2.25, -1.5)
  line L520 (-2.25, -1.5) -> (-2.25, 3.3824)
  line L521 (-2.25, 3.3824) -> (-1.75, -1.5) construction
  line L522 (-1.75, 3.3824) -> (-2.25, -1.5) construction
  line L523 (-1.25, 3.3824) -> (-0.75, 3.3824)
  line L524 (-0.75, 3.3824) -> (-0.75, -1.5)
  line L525 (-0.75, -1.5) -> (-1.25, -1.5)
  line L526 (-1.25, -1.5) -> (-1.25, 3.3824)
  line L527 (-1.25, 3.3824) -> (-0.75, -1.5) construction
  line L528 (-0.75, 3.3824) -> (-1.25, -1.5) construction
  line L529 (-0.25, 3.3824) -> (0.25, 3.3824)
  line L530 (0.25, 3.3824) -> (0.25, -1.5)
  line L531 (0.25, -1.5) -> (-0.25, -1.5)
  line L532 (-0.25, -1.5) -> (-0.25, 3.3824)
  line L533 (-0.25, 3.3824) -> (0.25, -1.5) construction
  line L534 (0.25, 3.3824) -> (-0.25, -1.5) construction
  line L535 (0.75, 3.3824) -> (1.25, 3.3824)
  line L536 (1.25, 3.3824) -> (1.25, -1.5)
  line L537 (1.25, -1.5) -> (0.75, -1.5)
  line L538 (0.75, -1.5) -> (0.75, 3.3824)
  line L539 (0.75, 3.3824) -> (1.25, -1.5) construction
  line L540 (1.25, 3.3824) -> (0.75, -1.5) construction
  line L541 (-9.25, 3.3824) -> (-8.75, 3.3824)
  line L542 (-8.75, 3.3824) -> (-8.75, -1.5)
  line L543 (-8.75, -1.5) -> (-9.25, -1.5)
  line L544 (-9.25, -1.5) -> (-9.25, 3.3824)
  line L545 (-9.25, 3.3824) -> (-8.75, -1.5) construction
  line L546 (-8.75, 3.3824) -> (-9.25, -1.5) construction
  line L547 (-8.25, 3.3824) -> (-7.75, 3.3824)
  line L548 (-7.75, 3.3824) -> (-7.75, -1.5)
  line L549 (-7.75, -1.5) -> (-8.25, -1.5)
  line L550 (-8.25, -1.5) -> (-8.25, 3.3824)
  line L551 (-8.25, 3.3824) -> (-7.75, -1.5) construction
  line L552 (-7.75, 3.3824) -> (-8.25, -1.5) construction
  line L553 (-7.25, 3.3824) -> (-6.75, 3.3824)
  line L554 (-6.75, 3.3824) -> (-6.75, -1.5)
  line L555 (-6.75, -1.5) -> (-7.25, -1.5)
  line L556 (-7.25, -1.5) -> (-7.25, 3.3824)
  line L557 (-7.25, 3.3824) -> (-6.75, -1.5) construction
  line L558 (-6.75, 3.3824) -> (-7.25, -1.5) construction
  line L559 (-6.25, 3.3824) -> (-5.75, 3.3824)
  line L560 (-5.75, 3.3824) -> (-5.75, -1.5)
  line L561 (-5.75, -1.5) -> (-6.25, -1.5)
  line L562 (-6.25, -1.5) -> (-6.25, 3.3824)
  line L563 (-6.25, 3.3824) -> (-5.75, -1.5) construction
  line L564 (-5.75, 3.3824) -> (-6.25, -1.5) construction
  line L565 (-5.25, 3.3824) -> (-4.75, 3.3824)
  line L566 (-4.75, 3.3824) -> (-4.75, -1.5)
  line L567 (-4.75, -1.5) -> (-5.25, -1.5)
  line L568 (-5.25, -1.5) -> (-5.25, 3.3824)
  line L569 (-5.25, 3.3824) -> (-4.75, -1.5) construction
  line L570 (-4.75, 3.3824) -> (-5.25, -1.5) construction
  line L571 (-4.25, 3.3824) -> (-3.75, 3.3824)
  line L572 (-3.75, 3.3824) -> (-3.75, -1.5)
  line L573 (-3.75, -1.5) -> (-4.25, -1.5)
  line L574 (-4.25, -1.5) -> (-4.25, 3.3824)
  line L575 (-4.25, 3.3824) -> (-3.75, -1.5) construction
  line L576 (-3.75, 3.3824) -> (-4.25, -1.5) construction
  line L577 (-3.25, 3.3824) -> (-2.75, 3.3824)
  line L578 (-2.75, 3.3824) -> (-2.75, -1.5)
  line L579 (-2.75, -1.5) -> (-3.25, -1.5)
  line L580 (-3.25, -1.5) -> (-3.25, 3.3824)
  line L581 (-3.25, 3.3824) -> (-2.75, -1.5) construction
  line L582 (-2.75, 3.3824) -> (-3.25, -1.5) construction
  line L583 (-2.25, 3.3824) -> (-1.75, 3.3824)
  line L584 (-1.75, 3.3824) -> (-1.75, -1.5)
  line L585 (-1.75, -1.5) -> (-2.25, -1.5)
  line L586 (-2.25, -1.5) -> (-2.25, 3.3824)
  line L587 (-2.25, 3.3824) -> (-1.75, -1.5) construction
  line L588 (-1.75, 3.3824) -> (-2.25, -1.5) construction
  line L589 (-1.25, 3.3824) -> (-0.75, 3.3824)
  line L590 (-0.75, 3.3824) -> (-0.75, -1.5)
  line L591 (-0.75, -1.5) -> (-1.25, -1.5)
  line L592 (-1.25, -1.5) -> (-1.25, 3.3824)
  line L593 (-1.25, 3.3824) -> (-0.75, -1.5) construction
  line L594 (-0.75, 3.3824) -> (-1.25, -1.5) construction
  line L595 (-0.25, 3.3824) -> (0.25, 3.3824)
  line L596 (0.25, 3.3824) -> (0.25, -1.5)
  line L597 (0.25, -1.5) -> (-0.25, -1.5)
  line L598 (-0.25, -1.5) -> (-0.25, 3.3824)
  line L599 (-0.25, 3.3824) -> (0.25, -1.5) construction
  line L600 (0.25, 3.3824) -> (-0.25, -1.5) construction
  point P0 (0, 0)
  point P1 (0, 0.9412)
  point P2 (1, 0.9412)
  point P3 (2, 0.9412)
  point P4 (3, 0.9412)
  point P5 (4, 0.9412)
  point P6 (5, 0.9412)
  point P7 (6, 0.9412)
  point P8 (7, 0.9412)
  point P9 (8, 0.9412)
  point P10 (9, 0.9412)
  point P11 (-1, 0.9412)
  point P12 (0, 0.9412)
  point P13 (1, 0.9412)
  point P14 (2, 0.9412)
  point P15 (3, 0.9412)
  point P16 (4, 0.9412)
  point P17 (5, 0.9412)
  point P18 (6, 0.9412)
  point P19 (7, 0.9412)
  point P20 (8, 0.9412)
  point P21 (-2, 0.9412)
  point P22 (-1, 0.9412)
  point P23 (0, 0.9412)
  point P24 (1, 0.9412)
  point P25 (2, 0.9412)
  point P26 (3, 0.9412)
  point P27 (4, 0.9412)
  point P28 (5, 0.9412)
  point P29 (6, 0.9412)
  point P30 (7, 0.9412)
  point P31 (-3, 0.9412)
  point P32 (-2, 0.9412)
  point P33 (-1, 0.9412)
  point P34 (0, 0.9412)
  point P35 (1, 0.9412)
  point P36 (2, 0.9412)
  point P37 (3, 0.9412)
  point P38 (4, 0.9412)
  point P39 (5, 0.9412)
  point P40 (6, 0.9412)
  point P41 (-4, 0.9412)
  point P42 (-3, 0.9412)
  point P43 (-2, 0.9412)
  point P44 (-1, 0.9412)
  point P45 (0, 0.9412)
  point P46 (1, 0.9412)
  point P47 (2, 0.9412)
  point P48 (3, 0.9412)
  point P49 (4, 0.9412)
  point P50 (5, 0.9412)
  point P51 (-5, 0.9412)
  point P52 (-4, 0.9412)
  point P53 (-3, 0.9412)
  point P54 (-2, 0.9412)
  point P55 (-1, 0.9412)
  point P56 (0, 0.9412)
  point P57 (1, 0.9412)
  point P58 (2, 0.9412)
  point P59 (3, 0.9412)
  point P60 (4, 0.9412)
  point P61 (-6, 0.9412)
  point P62 (-5, 0.9412)
  point P63 (-4, 0.9412)
  point P64 (-3, 0.9412)
  point P65 (-2, 0.9412)
  point P66 (-1, 0.9412)
  point P67 (0, 0.9412)
  point P68 (1, 0.9412)
  point P69 (2, 0.9412)
  point P70 (3, 0.9412)
  point P71 (-7, 0.9412)
  point P72 (-6, 0.9412)
  point P73 (-5, 0.9412)
  point P74 (-4, 0.9412)
  point P75 (-3, 0.9412)
  point P76 (-2, 0.9412)
  point P77 (-1, 0.9412)
  point P78 (0, 0.9412)
  point P79 (1, 0.9412)
  point P80 (2, 0.9412)
  point P81 (-8, 0.9412)
  point P82 (-7, 0.9412)
  point P83 (-6, 0.9412)
  point P84 (-5, 0.9412)
  point P85 (-4, 0.9412)
  point P86 (-3, 0.9412)
  point P87 (-2, 0.9412)
  point P88 (-1, 0.9412)
  point P89 (0, 0.9412)
  point P90 (1, 0.9412)
  point P91 (-9, 0.9412)
  point P92 (-8, 0.9412)
  point P93 (-7, 0.9412)
  point P94 (-6, 0.9412)
  point P95 (-5, 0.9412)
  point P96 (-4, 0.9412)
  point P97 (-3, 0.9412)
  point P98 (-2, 0.9412)
  point P99 (-1, 0.9412)
  point P100 (0, 0.9412)
  dimension "d4" = 0.5
  dimension "d5" = 1
  dimension "d8" = 1
  dimension "d11" = 1
extrude "Extrusion2" cut sketch "Sketch2" against normal blind 20
properties part number "cooling_fin"
